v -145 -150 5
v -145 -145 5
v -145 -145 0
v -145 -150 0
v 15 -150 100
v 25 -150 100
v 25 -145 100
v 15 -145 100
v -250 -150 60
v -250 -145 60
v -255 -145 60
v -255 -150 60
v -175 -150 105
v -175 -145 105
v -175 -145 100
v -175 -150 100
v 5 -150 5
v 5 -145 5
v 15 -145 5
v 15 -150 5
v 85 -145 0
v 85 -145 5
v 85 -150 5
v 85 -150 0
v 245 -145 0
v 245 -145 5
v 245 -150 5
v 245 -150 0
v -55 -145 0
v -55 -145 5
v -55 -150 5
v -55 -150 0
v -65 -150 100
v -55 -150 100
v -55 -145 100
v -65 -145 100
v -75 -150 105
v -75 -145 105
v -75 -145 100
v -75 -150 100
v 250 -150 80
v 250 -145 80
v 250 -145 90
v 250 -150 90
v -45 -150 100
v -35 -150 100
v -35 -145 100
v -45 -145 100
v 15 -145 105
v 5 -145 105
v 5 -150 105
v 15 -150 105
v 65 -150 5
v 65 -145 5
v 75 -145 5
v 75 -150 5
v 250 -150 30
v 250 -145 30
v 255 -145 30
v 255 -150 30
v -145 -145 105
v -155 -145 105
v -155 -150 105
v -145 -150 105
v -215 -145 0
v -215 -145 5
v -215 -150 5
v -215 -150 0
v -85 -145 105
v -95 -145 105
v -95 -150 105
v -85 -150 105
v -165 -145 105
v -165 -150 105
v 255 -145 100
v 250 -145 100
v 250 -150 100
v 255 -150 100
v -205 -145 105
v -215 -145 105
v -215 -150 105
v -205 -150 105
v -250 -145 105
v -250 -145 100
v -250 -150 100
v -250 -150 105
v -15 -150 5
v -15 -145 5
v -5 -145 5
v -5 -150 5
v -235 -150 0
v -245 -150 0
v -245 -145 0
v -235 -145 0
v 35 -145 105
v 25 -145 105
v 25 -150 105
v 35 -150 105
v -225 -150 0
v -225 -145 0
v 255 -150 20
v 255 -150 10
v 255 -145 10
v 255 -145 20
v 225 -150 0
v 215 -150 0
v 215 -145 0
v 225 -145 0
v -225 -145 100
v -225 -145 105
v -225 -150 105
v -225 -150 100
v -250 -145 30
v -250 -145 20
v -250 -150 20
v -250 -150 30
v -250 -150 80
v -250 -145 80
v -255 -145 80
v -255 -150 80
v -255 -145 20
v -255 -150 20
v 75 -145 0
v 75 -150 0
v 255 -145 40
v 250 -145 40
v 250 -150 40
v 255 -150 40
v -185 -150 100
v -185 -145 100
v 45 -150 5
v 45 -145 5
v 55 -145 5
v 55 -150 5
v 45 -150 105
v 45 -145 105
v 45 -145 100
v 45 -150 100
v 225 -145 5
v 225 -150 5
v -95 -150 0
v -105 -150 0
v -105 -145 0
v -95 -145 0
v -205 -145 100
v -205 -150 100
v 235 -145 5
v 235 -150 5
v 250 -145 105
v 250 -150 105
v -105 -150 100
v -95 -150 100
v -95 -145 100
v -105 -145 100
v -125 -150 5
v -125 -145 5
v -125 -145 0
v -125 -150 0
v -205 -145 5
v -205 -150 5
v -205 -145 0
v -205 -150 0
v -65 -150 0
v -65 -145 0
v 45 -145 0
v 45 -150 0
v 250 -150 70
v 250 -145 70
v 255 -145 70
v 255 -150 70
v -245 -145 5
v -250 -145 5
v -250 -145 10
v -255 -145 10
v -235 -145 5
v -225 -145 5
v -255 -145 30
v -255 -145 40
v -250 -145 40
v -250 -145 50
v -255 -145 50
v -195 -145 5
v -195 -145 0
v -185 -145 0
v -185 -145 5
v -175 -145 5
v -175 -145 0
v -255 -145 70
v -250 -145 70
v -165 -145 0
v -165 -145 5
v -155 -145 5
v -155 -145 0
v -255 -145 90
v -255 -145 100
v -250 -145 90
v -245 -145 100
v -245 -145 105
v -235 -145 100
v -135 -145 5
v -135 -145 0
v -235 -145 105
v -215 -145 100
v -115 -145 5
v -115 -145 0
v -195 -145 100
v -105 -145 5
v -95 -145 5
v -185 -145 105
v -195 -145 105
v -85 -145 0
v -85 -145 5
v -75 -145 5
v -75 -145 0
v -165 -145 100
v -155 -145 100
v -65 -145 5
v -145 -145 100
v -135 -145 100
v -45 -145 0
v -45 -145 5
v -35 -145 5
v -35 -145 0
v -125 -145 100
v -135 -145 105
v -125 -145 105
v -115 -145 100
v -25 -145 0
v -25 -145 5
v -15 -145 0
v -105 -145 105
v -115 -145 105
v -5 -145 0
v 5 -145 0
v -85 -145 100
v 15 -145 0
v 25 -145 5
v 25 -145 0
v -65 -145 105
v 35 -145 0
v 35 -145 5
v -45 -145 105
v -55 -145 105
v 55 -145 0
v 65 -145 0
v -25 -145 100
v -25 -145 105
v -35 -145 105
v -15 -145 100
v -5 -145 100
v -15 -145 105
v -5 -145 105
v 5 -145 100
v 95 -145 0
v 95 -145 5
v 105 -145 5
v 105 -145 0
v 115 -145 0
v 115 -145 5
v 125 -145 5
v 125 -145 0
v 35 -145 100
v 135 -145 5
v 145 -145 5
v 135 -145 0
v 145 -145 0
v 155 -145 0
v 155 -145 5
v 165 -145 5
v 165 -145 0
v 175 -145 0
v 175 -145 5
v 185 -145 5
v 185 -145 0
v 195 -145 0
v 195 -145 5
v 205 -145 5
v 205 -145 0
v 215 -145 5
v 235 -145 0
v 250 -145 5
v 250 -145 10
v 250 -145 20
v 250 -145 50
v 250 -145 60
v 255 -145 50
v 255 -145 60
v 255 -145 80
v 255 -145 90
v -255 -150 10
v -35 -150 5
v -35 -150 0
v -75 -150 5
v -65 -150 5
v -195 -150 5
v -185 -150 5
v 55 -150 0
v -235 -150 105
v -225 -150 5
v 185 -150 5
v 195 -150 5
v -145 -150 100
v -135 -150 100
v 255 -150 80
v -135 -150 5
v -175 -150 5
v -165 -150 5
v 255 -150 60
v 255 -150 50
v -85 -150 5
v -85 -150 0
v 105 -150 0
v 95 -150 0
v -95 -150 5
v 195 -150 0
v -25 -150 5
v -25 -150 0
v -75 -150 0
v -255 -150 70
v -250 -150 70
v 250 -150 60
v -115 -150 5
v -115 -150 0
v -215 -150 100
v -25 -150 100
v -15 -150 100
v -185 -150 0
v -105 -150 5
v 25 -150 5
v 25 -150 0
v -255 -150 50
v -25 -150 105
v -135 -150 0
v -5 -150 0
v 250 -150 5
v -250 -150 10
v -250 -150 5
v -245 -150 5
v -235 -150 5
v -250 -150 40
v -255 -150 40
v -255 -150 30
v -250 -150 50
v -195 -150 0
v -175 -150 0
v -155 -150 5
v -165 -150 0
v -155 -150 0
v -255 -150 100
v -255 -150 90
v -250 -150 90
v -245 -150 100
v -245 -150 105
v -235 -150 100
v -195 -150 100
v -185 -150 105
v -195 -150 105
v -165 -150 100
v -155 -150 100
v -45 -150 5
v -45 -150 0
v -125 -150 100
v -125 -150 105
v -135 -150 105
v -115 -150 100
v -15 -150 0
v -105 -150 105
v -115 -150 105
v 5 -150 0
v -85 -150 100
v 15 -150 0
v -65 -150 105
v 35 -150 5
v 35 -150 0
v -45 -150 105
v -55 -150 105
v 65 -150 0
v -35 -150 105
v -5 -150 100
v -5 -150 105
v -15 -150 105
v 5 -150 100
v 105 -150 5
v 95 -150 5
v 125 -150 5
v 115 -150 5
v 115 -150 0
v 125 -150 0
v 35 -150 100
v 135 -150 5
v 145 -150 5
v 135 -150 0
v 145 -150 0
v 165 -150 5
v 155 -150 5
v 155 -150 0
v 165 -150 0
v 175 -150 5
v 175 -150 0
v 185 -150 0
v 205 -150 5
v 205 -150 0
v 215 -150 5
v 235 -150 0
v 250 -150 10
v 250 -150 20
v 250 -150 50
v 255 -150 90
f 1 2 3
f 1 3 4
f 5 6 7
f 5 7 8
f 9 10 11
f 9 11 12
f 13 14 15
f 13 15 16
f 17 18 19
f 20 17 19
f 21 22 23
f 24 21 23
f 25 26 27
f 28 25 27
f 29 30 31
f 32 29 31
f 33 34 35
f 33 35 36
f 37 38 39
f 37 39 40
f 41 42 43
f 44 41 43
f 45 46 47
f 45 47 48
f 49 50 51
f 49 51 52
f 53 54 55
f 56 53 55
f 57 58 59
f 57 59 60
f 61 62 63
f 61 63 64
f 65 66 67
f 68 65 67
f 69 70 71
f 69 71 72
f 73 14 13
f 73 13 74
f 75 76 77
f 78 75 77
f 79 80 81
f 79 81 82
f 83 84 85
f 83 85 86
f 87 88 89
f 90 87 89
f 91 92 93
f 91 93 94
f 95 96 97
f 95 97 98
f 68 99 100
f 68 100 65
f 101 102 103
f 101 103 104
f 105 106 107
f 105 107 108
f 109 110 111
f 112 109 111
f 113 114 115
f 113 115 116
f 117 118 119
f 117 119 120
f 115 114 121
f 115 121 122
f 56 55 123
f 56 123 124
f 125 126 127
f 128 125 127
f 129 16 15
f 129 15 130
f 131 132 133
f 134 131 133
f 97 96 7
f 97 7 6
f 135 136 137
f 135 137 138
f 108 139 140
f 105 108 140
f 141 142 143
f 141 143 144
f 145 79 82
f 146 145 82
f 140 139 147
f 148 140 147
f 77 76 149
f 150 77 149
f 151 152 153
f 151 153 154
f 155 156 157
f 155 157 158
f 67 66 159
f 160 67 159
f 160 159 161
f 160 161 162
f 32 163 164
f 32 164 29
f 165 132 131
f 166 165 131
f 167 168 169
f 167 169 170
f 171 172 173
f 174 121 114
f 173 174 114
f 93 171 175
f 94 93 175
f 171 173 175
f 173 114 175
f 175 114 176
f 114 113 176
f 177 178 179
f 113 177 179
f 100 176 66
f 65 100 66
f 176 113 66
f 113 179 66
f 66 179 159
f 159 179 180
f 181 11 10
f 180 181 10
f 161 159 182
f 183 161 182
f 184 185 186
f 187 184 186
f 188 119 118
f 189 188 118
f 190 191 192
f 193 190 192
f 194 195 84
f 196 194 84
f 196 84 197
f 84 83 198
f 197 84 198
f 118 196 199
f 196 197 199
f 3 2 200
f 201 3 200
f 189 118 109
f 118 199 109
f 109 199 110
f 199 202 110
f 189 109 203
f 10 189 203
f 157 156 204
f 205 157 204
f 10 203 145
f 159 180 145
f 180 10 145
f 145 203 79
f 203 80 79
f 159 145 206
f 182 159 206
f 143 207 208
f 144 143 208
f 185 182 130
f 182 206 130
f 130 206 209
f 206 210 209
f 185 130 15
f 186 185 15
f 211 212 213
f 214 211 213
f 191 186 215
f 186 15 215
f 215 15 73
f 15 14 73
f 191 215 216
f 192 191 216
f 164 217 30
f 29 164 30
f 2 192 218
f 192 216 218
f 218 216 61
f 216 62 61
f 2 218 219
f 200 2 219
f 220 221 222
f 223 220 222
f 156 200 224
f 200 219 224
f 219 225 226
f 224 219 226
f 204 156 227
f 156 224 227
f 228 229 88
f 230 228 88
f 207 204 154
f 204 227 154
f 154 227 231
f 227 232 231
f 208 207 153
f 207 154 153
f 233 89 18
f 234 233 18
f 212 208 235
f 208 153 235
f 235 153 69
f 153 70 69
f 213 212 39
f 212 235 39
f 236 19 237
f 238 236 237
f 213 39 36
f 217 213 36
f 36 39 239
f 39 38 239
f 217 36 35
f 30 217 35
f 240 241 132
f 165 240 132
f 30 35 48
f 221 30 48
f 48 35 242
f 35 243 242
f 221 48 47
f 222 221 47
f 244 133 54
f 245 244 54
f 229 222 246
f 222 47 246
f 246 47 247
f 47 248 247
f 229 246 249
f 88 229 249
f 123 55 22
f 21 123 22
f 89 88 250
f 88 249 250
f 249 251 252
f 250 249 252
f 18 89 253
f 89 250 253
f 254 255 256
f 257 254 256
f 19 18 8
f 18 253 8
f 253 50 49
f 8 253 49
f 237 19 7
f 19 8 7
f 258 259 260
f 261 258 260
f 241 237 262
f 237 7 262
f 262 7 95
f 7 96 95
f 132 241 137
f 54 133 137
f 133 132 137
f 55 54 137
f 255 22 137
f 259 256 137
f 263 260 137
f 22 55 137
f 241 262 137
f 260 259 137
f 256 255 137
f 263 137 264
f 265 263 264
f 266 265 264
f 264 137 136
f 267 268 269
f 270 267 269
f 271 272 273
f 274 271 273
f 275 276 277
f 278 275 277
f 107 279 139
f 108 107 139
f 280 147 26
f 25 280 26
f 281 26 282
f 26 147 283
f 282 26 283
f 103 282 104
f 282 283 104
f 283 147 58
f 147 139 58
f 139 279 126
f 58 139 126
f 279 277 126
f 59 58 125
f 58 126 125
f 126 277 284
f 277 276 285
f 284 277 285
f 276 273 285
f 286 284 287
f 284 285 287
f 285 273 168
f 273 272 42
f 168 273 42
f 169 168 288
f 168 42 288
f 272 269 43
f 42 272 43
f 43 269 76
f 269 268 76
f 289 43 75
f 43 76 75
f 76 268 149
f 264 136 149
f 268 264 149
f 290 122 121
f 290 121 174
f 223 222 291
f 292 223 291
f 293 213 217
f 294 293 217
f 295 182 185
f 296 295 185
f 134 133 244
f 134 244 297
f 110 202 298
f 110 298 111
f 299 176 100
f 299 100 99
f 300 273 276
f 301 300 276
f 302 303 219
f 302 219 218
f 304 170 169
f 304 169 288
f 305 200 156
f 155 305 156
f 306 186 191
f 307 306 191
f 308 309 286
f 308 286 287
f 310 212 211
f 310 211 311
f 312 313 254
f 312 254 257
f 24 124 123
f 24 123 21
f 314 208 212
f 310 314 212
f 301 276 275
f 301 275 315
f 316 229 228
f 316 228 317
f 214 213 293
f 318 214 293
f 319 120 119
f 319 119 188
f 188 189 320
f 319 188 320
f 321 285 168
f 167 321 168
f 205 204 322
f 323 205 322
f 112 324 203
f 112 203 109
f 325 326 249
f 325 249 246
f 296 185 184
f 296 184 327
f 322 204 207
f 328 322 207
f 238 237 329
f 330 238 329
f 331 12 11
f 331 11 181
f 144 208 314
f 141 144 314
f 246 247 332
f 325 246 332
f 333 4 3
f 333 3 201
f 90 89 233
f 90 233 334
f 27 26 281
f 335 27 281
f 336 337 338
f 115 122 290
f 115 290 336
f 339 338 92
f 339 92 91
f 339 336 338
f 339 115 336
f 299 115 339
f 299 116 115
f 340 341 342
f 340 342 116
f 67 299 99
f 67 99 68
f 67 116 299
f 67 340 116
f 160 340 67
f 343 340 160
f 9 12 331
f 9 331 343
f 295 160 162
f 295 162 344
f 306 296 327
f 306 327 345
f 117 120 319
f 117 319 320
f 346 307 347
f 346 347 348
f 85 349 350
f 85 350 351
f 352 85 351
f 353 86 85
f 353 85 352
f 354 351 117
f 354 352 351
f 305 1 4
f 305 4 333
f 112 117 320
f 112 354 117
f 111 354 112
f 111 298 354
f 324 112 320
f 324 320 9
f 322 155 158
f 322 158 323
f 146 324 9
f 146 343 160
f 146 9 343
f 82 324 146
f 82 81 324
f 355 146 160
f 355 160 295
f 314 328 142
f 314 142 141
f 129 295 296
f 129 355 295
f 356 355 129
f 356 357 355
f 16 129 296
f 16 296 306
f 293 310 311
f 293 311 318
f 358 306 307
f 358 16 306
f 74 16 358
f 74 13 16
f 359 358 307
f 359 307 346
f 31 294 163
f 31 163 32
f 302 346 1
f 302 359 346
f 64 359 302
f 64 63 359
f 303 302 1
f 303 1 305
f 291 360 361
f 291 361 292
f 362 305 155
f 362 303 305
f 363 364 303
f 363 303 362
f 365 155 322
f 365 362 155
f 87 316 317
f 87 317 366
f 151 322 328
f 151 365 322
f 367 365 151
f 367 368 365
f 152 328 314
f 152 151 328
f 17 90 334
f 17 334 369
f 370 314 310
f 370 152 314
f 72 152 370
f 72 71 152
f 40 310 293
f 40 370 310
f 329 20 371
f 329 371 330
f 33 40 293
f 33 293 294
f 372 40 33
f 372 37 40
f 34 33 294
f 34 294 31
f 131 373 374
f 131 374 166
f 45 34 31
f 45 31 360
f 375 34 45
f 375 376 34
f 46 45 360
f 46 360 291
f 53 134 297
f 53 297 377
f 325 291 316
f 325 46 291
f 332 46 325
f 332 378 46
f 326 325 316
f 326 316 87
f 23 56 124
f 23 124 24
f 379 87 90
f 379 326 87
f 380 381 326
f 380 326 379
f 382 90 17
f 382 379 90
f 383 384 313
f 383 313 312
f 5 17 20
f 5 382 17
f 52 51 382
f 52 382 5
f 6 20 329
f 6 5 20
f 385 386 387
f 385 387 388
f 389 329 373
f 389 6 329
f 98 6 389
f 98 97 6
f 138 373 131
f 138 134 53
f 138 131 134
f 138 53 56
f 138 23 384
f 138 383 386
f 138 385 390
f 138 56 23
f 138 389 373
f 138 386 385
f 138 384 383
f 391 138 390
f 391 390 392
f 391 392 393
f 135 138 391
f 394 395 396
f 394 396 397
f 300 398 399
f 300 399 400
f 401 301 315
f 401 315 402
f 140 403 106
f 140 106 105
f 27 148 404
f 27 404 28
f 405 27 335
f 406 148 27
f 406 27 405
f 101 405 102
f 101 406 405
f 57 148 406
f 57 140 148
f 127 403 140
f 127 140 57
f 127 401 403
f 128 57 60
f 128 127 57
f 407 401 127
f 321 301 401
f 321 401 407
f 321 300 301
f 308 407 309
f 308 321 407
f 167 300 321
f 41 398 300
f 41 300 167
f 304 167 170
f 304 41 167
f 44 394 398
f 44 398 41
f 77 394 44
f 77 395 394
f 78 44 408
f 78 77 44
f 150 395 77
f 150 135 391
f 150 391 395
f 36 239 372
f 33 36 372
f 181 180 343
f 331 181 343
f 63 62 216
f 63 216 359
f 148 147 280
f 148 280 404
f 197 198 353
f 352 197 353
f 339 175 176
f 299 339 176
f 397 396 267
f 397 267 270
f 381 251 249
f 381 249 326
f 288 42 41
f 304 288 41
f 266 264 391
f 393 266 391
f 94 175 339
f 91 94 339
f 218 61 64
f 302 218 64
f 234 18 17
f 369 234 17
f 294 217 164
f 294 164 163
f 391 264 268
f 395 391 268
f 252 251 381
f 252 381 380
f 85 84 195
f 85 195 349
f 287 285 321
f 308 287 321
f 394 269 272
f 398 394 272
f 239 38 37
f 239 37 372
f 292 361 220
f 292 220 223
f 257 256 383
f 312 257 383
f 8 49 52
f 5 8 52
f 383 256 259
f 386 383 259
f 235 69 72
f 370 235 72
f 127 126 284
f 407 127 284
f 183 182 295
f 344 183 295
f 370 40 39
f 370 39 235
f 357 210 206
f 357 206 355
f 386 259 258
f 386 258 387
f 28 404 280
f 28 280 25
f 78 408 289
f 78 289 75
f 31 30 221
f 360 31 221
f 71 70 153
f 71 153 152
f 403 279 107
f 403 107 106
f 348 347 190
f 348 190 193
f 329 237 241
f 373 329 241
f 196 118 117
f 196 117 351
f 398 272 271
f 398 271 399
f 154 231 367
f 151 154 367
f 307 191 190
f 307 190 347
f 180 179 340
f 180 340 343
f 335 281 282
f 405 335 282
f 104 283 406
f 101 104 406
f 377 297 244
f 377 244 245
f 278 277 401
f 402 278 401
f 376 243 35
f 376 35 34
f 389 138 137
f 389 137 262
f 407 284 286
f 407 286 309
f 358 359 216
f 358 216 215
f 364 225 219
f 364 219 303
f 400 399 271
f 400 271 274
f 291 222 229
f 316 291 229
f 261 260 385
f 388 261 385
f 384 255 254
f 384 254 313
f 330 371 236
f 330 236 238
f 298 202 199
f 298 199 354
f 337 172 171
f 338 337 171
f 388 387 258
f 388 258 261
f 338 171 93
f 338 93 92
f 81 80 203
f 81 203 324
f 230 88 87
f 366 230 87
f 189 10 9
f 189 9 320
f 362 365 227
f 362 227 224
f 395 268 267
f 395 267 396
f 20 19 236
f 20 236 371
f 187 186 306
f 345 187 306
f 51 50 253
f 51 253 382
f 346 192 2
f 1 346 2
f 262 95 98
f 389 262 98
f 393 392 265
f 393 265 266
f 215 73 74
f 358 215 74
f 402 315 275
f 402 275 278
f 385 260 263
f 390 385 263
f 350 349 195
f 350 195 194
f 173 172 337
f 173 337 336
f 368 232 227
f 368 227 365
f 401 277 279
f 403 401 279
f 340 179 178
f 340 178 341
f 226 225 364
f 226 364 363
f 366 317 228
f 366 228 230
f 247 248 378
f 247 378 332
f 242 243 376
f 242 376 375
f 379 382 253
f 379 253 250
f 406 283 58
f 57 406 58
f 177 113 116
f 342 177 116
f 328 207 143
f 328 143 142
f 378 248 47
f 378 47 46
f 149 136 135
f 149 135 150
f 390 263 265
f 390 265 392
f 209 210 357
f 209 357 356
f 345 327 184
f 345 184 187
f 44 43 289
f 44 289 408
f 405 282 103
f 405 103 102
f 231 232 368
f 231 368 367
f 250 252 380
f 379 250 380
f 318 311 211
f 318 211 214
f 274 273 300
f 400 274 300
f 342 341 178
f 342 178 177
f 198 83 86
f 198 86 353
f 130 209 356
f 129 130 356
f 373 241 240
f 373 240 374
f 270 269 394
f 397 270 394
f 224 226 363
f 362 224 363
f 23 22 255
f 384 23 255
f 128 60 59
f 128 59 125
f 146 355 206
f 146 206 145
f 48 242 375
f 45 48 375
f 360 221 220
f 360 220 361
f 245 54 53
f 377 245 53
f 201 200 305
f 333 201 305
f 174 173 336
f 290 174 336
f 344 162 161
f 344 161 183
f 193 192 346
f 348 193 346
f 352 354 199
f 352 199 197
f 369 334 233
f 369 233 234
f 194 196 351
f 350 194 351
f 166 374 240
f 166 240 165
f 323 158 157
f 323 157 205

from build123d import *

# Parameters (mm, degrees)
SKETCH003_W             = 500
SKETCH003_H             = 100
PAD003_DEPTH            = 5
SKETCH025_W             = 10
SKETCH025_H             = 5
PAD023_DEPTH            = 5
LINEARPATTERN005_COUNT  = 25
LINEARPATTERN005_PITCH  = 20
SKETCH026_W             = 10
SKETCH026_H             = 5
PAD024_DEPTH            = 5
LINEARPATTERN006_COUNT  = 5
LINEARPATTERN006_PITCH  = 20
SKETCH027_W             = 10
SKETCH027_H             = 5
PAD025_DEPTH            = 5
LINEARPATTERN007_COUNT  = 5
LINEARPATTERN007_PITCH  = 20
SKETCH122_W             = 10
SKETCH122_H             = 5
POCKET032_DEPTH         = 5
LINEARPATTERN074_COUNT  = 15
LINEARPATTERN074_PITCH  = 20
BODY003_PLACEMENT_ANGLE = 90


with BuildPart() as part:
    # Sketch003 → Pad003 (new body)
    with BuildSketch(Plane.XY):
        Rectangle(SKETCH003_W, SKETCH003_H)
    extrude(amount=PAD003_DEPTH)

    # Sketch025 (on DatumPlane) → Pad023 (join)
    with BuildSketch(Plane.XZ.offset(50)):
        with Locations((-240, 2.5)):
            Rectangle(SKETCH025_W, SKETCH025_H)
    pad023 = extrude(amount=PAD023_DEPTH)

    # LinearPattern005: Pad023 ×25
    with Locations(*[(i * LINEARPATTERN005_PITCH, 0, 0) for i in range(1, LINEARPATTERN005_COUNT)]):
        add(pad023)

    # Sketch026 (on DatumPlane) → Pad024 (join)
    with BuildSketch(Plane.YZ.offset(250)):
        with Locations((-40, 2.5)):
            Rectangle(SKETCH026_W, SKETCH026_H)
    pad024 = extrude(amount=PAD024_DEPTH)

    # LinearPattern006: Pad024 ×5
    with Locations(*[(0, i * LINEARPATTERN006_PITCH, 0) for i in range(1, LINEARPATTERN006_COUNT)]):
        add(pad024)

    # Sketch027 (on DatumPlane) → Pad025 (join)
    with BuildSketch(Plane(origin=(-250, 0, 0), x_dir=(0, -1, 0), z_dir=(-1, 0, 0))):
        with Locations((-40, 2.5)):
            Rectangle(SKETCH027_W, SKETCH027_H)
    pad025 = extrude(amount=PAD025_DEPTH)

    # LinearPattern007: Pad025 ×5
    with Locations(*[(0, -i * LINEARPATTERN007_PITCH, 0) for i in range(1, LINEARPATTERN007_COUNT)]):
        add(pad025)

    # Sketch122 (on DatumPlane) → Pocket032 (cut)
    with BuildSketch(Plane(origin=(0, 50, 0), x_dir=(-1, 0, 0), z_dir=(0, 1, 0))):
        with Locations((240, 2.5)):
            Rectangle(SKETCH122_W, SKETCH122_H)
    pocket032 = extrude(amount=-POCKET032_DEPTH, mode=Mode.SUBTRACT)

    # LinearPattern074: Pocket032 ×15
    with Locations(*[(i * LINEARPATTERN074_PITCH, 0, 0) for i in range(1, LINEARPATTERN074_COUNT)]):
        add(pocket032, mode=Mode.SUBTRACT)


with BuildPart() as part_1:
    # Body003 placement: moved
    add(part.part.moved(Location((0, -145, 55))).rotate(Axis((0, -145, 55), (1, 0, 0)), BODY003_PLACEMENT_ANGLE))


solid = part_1.part
